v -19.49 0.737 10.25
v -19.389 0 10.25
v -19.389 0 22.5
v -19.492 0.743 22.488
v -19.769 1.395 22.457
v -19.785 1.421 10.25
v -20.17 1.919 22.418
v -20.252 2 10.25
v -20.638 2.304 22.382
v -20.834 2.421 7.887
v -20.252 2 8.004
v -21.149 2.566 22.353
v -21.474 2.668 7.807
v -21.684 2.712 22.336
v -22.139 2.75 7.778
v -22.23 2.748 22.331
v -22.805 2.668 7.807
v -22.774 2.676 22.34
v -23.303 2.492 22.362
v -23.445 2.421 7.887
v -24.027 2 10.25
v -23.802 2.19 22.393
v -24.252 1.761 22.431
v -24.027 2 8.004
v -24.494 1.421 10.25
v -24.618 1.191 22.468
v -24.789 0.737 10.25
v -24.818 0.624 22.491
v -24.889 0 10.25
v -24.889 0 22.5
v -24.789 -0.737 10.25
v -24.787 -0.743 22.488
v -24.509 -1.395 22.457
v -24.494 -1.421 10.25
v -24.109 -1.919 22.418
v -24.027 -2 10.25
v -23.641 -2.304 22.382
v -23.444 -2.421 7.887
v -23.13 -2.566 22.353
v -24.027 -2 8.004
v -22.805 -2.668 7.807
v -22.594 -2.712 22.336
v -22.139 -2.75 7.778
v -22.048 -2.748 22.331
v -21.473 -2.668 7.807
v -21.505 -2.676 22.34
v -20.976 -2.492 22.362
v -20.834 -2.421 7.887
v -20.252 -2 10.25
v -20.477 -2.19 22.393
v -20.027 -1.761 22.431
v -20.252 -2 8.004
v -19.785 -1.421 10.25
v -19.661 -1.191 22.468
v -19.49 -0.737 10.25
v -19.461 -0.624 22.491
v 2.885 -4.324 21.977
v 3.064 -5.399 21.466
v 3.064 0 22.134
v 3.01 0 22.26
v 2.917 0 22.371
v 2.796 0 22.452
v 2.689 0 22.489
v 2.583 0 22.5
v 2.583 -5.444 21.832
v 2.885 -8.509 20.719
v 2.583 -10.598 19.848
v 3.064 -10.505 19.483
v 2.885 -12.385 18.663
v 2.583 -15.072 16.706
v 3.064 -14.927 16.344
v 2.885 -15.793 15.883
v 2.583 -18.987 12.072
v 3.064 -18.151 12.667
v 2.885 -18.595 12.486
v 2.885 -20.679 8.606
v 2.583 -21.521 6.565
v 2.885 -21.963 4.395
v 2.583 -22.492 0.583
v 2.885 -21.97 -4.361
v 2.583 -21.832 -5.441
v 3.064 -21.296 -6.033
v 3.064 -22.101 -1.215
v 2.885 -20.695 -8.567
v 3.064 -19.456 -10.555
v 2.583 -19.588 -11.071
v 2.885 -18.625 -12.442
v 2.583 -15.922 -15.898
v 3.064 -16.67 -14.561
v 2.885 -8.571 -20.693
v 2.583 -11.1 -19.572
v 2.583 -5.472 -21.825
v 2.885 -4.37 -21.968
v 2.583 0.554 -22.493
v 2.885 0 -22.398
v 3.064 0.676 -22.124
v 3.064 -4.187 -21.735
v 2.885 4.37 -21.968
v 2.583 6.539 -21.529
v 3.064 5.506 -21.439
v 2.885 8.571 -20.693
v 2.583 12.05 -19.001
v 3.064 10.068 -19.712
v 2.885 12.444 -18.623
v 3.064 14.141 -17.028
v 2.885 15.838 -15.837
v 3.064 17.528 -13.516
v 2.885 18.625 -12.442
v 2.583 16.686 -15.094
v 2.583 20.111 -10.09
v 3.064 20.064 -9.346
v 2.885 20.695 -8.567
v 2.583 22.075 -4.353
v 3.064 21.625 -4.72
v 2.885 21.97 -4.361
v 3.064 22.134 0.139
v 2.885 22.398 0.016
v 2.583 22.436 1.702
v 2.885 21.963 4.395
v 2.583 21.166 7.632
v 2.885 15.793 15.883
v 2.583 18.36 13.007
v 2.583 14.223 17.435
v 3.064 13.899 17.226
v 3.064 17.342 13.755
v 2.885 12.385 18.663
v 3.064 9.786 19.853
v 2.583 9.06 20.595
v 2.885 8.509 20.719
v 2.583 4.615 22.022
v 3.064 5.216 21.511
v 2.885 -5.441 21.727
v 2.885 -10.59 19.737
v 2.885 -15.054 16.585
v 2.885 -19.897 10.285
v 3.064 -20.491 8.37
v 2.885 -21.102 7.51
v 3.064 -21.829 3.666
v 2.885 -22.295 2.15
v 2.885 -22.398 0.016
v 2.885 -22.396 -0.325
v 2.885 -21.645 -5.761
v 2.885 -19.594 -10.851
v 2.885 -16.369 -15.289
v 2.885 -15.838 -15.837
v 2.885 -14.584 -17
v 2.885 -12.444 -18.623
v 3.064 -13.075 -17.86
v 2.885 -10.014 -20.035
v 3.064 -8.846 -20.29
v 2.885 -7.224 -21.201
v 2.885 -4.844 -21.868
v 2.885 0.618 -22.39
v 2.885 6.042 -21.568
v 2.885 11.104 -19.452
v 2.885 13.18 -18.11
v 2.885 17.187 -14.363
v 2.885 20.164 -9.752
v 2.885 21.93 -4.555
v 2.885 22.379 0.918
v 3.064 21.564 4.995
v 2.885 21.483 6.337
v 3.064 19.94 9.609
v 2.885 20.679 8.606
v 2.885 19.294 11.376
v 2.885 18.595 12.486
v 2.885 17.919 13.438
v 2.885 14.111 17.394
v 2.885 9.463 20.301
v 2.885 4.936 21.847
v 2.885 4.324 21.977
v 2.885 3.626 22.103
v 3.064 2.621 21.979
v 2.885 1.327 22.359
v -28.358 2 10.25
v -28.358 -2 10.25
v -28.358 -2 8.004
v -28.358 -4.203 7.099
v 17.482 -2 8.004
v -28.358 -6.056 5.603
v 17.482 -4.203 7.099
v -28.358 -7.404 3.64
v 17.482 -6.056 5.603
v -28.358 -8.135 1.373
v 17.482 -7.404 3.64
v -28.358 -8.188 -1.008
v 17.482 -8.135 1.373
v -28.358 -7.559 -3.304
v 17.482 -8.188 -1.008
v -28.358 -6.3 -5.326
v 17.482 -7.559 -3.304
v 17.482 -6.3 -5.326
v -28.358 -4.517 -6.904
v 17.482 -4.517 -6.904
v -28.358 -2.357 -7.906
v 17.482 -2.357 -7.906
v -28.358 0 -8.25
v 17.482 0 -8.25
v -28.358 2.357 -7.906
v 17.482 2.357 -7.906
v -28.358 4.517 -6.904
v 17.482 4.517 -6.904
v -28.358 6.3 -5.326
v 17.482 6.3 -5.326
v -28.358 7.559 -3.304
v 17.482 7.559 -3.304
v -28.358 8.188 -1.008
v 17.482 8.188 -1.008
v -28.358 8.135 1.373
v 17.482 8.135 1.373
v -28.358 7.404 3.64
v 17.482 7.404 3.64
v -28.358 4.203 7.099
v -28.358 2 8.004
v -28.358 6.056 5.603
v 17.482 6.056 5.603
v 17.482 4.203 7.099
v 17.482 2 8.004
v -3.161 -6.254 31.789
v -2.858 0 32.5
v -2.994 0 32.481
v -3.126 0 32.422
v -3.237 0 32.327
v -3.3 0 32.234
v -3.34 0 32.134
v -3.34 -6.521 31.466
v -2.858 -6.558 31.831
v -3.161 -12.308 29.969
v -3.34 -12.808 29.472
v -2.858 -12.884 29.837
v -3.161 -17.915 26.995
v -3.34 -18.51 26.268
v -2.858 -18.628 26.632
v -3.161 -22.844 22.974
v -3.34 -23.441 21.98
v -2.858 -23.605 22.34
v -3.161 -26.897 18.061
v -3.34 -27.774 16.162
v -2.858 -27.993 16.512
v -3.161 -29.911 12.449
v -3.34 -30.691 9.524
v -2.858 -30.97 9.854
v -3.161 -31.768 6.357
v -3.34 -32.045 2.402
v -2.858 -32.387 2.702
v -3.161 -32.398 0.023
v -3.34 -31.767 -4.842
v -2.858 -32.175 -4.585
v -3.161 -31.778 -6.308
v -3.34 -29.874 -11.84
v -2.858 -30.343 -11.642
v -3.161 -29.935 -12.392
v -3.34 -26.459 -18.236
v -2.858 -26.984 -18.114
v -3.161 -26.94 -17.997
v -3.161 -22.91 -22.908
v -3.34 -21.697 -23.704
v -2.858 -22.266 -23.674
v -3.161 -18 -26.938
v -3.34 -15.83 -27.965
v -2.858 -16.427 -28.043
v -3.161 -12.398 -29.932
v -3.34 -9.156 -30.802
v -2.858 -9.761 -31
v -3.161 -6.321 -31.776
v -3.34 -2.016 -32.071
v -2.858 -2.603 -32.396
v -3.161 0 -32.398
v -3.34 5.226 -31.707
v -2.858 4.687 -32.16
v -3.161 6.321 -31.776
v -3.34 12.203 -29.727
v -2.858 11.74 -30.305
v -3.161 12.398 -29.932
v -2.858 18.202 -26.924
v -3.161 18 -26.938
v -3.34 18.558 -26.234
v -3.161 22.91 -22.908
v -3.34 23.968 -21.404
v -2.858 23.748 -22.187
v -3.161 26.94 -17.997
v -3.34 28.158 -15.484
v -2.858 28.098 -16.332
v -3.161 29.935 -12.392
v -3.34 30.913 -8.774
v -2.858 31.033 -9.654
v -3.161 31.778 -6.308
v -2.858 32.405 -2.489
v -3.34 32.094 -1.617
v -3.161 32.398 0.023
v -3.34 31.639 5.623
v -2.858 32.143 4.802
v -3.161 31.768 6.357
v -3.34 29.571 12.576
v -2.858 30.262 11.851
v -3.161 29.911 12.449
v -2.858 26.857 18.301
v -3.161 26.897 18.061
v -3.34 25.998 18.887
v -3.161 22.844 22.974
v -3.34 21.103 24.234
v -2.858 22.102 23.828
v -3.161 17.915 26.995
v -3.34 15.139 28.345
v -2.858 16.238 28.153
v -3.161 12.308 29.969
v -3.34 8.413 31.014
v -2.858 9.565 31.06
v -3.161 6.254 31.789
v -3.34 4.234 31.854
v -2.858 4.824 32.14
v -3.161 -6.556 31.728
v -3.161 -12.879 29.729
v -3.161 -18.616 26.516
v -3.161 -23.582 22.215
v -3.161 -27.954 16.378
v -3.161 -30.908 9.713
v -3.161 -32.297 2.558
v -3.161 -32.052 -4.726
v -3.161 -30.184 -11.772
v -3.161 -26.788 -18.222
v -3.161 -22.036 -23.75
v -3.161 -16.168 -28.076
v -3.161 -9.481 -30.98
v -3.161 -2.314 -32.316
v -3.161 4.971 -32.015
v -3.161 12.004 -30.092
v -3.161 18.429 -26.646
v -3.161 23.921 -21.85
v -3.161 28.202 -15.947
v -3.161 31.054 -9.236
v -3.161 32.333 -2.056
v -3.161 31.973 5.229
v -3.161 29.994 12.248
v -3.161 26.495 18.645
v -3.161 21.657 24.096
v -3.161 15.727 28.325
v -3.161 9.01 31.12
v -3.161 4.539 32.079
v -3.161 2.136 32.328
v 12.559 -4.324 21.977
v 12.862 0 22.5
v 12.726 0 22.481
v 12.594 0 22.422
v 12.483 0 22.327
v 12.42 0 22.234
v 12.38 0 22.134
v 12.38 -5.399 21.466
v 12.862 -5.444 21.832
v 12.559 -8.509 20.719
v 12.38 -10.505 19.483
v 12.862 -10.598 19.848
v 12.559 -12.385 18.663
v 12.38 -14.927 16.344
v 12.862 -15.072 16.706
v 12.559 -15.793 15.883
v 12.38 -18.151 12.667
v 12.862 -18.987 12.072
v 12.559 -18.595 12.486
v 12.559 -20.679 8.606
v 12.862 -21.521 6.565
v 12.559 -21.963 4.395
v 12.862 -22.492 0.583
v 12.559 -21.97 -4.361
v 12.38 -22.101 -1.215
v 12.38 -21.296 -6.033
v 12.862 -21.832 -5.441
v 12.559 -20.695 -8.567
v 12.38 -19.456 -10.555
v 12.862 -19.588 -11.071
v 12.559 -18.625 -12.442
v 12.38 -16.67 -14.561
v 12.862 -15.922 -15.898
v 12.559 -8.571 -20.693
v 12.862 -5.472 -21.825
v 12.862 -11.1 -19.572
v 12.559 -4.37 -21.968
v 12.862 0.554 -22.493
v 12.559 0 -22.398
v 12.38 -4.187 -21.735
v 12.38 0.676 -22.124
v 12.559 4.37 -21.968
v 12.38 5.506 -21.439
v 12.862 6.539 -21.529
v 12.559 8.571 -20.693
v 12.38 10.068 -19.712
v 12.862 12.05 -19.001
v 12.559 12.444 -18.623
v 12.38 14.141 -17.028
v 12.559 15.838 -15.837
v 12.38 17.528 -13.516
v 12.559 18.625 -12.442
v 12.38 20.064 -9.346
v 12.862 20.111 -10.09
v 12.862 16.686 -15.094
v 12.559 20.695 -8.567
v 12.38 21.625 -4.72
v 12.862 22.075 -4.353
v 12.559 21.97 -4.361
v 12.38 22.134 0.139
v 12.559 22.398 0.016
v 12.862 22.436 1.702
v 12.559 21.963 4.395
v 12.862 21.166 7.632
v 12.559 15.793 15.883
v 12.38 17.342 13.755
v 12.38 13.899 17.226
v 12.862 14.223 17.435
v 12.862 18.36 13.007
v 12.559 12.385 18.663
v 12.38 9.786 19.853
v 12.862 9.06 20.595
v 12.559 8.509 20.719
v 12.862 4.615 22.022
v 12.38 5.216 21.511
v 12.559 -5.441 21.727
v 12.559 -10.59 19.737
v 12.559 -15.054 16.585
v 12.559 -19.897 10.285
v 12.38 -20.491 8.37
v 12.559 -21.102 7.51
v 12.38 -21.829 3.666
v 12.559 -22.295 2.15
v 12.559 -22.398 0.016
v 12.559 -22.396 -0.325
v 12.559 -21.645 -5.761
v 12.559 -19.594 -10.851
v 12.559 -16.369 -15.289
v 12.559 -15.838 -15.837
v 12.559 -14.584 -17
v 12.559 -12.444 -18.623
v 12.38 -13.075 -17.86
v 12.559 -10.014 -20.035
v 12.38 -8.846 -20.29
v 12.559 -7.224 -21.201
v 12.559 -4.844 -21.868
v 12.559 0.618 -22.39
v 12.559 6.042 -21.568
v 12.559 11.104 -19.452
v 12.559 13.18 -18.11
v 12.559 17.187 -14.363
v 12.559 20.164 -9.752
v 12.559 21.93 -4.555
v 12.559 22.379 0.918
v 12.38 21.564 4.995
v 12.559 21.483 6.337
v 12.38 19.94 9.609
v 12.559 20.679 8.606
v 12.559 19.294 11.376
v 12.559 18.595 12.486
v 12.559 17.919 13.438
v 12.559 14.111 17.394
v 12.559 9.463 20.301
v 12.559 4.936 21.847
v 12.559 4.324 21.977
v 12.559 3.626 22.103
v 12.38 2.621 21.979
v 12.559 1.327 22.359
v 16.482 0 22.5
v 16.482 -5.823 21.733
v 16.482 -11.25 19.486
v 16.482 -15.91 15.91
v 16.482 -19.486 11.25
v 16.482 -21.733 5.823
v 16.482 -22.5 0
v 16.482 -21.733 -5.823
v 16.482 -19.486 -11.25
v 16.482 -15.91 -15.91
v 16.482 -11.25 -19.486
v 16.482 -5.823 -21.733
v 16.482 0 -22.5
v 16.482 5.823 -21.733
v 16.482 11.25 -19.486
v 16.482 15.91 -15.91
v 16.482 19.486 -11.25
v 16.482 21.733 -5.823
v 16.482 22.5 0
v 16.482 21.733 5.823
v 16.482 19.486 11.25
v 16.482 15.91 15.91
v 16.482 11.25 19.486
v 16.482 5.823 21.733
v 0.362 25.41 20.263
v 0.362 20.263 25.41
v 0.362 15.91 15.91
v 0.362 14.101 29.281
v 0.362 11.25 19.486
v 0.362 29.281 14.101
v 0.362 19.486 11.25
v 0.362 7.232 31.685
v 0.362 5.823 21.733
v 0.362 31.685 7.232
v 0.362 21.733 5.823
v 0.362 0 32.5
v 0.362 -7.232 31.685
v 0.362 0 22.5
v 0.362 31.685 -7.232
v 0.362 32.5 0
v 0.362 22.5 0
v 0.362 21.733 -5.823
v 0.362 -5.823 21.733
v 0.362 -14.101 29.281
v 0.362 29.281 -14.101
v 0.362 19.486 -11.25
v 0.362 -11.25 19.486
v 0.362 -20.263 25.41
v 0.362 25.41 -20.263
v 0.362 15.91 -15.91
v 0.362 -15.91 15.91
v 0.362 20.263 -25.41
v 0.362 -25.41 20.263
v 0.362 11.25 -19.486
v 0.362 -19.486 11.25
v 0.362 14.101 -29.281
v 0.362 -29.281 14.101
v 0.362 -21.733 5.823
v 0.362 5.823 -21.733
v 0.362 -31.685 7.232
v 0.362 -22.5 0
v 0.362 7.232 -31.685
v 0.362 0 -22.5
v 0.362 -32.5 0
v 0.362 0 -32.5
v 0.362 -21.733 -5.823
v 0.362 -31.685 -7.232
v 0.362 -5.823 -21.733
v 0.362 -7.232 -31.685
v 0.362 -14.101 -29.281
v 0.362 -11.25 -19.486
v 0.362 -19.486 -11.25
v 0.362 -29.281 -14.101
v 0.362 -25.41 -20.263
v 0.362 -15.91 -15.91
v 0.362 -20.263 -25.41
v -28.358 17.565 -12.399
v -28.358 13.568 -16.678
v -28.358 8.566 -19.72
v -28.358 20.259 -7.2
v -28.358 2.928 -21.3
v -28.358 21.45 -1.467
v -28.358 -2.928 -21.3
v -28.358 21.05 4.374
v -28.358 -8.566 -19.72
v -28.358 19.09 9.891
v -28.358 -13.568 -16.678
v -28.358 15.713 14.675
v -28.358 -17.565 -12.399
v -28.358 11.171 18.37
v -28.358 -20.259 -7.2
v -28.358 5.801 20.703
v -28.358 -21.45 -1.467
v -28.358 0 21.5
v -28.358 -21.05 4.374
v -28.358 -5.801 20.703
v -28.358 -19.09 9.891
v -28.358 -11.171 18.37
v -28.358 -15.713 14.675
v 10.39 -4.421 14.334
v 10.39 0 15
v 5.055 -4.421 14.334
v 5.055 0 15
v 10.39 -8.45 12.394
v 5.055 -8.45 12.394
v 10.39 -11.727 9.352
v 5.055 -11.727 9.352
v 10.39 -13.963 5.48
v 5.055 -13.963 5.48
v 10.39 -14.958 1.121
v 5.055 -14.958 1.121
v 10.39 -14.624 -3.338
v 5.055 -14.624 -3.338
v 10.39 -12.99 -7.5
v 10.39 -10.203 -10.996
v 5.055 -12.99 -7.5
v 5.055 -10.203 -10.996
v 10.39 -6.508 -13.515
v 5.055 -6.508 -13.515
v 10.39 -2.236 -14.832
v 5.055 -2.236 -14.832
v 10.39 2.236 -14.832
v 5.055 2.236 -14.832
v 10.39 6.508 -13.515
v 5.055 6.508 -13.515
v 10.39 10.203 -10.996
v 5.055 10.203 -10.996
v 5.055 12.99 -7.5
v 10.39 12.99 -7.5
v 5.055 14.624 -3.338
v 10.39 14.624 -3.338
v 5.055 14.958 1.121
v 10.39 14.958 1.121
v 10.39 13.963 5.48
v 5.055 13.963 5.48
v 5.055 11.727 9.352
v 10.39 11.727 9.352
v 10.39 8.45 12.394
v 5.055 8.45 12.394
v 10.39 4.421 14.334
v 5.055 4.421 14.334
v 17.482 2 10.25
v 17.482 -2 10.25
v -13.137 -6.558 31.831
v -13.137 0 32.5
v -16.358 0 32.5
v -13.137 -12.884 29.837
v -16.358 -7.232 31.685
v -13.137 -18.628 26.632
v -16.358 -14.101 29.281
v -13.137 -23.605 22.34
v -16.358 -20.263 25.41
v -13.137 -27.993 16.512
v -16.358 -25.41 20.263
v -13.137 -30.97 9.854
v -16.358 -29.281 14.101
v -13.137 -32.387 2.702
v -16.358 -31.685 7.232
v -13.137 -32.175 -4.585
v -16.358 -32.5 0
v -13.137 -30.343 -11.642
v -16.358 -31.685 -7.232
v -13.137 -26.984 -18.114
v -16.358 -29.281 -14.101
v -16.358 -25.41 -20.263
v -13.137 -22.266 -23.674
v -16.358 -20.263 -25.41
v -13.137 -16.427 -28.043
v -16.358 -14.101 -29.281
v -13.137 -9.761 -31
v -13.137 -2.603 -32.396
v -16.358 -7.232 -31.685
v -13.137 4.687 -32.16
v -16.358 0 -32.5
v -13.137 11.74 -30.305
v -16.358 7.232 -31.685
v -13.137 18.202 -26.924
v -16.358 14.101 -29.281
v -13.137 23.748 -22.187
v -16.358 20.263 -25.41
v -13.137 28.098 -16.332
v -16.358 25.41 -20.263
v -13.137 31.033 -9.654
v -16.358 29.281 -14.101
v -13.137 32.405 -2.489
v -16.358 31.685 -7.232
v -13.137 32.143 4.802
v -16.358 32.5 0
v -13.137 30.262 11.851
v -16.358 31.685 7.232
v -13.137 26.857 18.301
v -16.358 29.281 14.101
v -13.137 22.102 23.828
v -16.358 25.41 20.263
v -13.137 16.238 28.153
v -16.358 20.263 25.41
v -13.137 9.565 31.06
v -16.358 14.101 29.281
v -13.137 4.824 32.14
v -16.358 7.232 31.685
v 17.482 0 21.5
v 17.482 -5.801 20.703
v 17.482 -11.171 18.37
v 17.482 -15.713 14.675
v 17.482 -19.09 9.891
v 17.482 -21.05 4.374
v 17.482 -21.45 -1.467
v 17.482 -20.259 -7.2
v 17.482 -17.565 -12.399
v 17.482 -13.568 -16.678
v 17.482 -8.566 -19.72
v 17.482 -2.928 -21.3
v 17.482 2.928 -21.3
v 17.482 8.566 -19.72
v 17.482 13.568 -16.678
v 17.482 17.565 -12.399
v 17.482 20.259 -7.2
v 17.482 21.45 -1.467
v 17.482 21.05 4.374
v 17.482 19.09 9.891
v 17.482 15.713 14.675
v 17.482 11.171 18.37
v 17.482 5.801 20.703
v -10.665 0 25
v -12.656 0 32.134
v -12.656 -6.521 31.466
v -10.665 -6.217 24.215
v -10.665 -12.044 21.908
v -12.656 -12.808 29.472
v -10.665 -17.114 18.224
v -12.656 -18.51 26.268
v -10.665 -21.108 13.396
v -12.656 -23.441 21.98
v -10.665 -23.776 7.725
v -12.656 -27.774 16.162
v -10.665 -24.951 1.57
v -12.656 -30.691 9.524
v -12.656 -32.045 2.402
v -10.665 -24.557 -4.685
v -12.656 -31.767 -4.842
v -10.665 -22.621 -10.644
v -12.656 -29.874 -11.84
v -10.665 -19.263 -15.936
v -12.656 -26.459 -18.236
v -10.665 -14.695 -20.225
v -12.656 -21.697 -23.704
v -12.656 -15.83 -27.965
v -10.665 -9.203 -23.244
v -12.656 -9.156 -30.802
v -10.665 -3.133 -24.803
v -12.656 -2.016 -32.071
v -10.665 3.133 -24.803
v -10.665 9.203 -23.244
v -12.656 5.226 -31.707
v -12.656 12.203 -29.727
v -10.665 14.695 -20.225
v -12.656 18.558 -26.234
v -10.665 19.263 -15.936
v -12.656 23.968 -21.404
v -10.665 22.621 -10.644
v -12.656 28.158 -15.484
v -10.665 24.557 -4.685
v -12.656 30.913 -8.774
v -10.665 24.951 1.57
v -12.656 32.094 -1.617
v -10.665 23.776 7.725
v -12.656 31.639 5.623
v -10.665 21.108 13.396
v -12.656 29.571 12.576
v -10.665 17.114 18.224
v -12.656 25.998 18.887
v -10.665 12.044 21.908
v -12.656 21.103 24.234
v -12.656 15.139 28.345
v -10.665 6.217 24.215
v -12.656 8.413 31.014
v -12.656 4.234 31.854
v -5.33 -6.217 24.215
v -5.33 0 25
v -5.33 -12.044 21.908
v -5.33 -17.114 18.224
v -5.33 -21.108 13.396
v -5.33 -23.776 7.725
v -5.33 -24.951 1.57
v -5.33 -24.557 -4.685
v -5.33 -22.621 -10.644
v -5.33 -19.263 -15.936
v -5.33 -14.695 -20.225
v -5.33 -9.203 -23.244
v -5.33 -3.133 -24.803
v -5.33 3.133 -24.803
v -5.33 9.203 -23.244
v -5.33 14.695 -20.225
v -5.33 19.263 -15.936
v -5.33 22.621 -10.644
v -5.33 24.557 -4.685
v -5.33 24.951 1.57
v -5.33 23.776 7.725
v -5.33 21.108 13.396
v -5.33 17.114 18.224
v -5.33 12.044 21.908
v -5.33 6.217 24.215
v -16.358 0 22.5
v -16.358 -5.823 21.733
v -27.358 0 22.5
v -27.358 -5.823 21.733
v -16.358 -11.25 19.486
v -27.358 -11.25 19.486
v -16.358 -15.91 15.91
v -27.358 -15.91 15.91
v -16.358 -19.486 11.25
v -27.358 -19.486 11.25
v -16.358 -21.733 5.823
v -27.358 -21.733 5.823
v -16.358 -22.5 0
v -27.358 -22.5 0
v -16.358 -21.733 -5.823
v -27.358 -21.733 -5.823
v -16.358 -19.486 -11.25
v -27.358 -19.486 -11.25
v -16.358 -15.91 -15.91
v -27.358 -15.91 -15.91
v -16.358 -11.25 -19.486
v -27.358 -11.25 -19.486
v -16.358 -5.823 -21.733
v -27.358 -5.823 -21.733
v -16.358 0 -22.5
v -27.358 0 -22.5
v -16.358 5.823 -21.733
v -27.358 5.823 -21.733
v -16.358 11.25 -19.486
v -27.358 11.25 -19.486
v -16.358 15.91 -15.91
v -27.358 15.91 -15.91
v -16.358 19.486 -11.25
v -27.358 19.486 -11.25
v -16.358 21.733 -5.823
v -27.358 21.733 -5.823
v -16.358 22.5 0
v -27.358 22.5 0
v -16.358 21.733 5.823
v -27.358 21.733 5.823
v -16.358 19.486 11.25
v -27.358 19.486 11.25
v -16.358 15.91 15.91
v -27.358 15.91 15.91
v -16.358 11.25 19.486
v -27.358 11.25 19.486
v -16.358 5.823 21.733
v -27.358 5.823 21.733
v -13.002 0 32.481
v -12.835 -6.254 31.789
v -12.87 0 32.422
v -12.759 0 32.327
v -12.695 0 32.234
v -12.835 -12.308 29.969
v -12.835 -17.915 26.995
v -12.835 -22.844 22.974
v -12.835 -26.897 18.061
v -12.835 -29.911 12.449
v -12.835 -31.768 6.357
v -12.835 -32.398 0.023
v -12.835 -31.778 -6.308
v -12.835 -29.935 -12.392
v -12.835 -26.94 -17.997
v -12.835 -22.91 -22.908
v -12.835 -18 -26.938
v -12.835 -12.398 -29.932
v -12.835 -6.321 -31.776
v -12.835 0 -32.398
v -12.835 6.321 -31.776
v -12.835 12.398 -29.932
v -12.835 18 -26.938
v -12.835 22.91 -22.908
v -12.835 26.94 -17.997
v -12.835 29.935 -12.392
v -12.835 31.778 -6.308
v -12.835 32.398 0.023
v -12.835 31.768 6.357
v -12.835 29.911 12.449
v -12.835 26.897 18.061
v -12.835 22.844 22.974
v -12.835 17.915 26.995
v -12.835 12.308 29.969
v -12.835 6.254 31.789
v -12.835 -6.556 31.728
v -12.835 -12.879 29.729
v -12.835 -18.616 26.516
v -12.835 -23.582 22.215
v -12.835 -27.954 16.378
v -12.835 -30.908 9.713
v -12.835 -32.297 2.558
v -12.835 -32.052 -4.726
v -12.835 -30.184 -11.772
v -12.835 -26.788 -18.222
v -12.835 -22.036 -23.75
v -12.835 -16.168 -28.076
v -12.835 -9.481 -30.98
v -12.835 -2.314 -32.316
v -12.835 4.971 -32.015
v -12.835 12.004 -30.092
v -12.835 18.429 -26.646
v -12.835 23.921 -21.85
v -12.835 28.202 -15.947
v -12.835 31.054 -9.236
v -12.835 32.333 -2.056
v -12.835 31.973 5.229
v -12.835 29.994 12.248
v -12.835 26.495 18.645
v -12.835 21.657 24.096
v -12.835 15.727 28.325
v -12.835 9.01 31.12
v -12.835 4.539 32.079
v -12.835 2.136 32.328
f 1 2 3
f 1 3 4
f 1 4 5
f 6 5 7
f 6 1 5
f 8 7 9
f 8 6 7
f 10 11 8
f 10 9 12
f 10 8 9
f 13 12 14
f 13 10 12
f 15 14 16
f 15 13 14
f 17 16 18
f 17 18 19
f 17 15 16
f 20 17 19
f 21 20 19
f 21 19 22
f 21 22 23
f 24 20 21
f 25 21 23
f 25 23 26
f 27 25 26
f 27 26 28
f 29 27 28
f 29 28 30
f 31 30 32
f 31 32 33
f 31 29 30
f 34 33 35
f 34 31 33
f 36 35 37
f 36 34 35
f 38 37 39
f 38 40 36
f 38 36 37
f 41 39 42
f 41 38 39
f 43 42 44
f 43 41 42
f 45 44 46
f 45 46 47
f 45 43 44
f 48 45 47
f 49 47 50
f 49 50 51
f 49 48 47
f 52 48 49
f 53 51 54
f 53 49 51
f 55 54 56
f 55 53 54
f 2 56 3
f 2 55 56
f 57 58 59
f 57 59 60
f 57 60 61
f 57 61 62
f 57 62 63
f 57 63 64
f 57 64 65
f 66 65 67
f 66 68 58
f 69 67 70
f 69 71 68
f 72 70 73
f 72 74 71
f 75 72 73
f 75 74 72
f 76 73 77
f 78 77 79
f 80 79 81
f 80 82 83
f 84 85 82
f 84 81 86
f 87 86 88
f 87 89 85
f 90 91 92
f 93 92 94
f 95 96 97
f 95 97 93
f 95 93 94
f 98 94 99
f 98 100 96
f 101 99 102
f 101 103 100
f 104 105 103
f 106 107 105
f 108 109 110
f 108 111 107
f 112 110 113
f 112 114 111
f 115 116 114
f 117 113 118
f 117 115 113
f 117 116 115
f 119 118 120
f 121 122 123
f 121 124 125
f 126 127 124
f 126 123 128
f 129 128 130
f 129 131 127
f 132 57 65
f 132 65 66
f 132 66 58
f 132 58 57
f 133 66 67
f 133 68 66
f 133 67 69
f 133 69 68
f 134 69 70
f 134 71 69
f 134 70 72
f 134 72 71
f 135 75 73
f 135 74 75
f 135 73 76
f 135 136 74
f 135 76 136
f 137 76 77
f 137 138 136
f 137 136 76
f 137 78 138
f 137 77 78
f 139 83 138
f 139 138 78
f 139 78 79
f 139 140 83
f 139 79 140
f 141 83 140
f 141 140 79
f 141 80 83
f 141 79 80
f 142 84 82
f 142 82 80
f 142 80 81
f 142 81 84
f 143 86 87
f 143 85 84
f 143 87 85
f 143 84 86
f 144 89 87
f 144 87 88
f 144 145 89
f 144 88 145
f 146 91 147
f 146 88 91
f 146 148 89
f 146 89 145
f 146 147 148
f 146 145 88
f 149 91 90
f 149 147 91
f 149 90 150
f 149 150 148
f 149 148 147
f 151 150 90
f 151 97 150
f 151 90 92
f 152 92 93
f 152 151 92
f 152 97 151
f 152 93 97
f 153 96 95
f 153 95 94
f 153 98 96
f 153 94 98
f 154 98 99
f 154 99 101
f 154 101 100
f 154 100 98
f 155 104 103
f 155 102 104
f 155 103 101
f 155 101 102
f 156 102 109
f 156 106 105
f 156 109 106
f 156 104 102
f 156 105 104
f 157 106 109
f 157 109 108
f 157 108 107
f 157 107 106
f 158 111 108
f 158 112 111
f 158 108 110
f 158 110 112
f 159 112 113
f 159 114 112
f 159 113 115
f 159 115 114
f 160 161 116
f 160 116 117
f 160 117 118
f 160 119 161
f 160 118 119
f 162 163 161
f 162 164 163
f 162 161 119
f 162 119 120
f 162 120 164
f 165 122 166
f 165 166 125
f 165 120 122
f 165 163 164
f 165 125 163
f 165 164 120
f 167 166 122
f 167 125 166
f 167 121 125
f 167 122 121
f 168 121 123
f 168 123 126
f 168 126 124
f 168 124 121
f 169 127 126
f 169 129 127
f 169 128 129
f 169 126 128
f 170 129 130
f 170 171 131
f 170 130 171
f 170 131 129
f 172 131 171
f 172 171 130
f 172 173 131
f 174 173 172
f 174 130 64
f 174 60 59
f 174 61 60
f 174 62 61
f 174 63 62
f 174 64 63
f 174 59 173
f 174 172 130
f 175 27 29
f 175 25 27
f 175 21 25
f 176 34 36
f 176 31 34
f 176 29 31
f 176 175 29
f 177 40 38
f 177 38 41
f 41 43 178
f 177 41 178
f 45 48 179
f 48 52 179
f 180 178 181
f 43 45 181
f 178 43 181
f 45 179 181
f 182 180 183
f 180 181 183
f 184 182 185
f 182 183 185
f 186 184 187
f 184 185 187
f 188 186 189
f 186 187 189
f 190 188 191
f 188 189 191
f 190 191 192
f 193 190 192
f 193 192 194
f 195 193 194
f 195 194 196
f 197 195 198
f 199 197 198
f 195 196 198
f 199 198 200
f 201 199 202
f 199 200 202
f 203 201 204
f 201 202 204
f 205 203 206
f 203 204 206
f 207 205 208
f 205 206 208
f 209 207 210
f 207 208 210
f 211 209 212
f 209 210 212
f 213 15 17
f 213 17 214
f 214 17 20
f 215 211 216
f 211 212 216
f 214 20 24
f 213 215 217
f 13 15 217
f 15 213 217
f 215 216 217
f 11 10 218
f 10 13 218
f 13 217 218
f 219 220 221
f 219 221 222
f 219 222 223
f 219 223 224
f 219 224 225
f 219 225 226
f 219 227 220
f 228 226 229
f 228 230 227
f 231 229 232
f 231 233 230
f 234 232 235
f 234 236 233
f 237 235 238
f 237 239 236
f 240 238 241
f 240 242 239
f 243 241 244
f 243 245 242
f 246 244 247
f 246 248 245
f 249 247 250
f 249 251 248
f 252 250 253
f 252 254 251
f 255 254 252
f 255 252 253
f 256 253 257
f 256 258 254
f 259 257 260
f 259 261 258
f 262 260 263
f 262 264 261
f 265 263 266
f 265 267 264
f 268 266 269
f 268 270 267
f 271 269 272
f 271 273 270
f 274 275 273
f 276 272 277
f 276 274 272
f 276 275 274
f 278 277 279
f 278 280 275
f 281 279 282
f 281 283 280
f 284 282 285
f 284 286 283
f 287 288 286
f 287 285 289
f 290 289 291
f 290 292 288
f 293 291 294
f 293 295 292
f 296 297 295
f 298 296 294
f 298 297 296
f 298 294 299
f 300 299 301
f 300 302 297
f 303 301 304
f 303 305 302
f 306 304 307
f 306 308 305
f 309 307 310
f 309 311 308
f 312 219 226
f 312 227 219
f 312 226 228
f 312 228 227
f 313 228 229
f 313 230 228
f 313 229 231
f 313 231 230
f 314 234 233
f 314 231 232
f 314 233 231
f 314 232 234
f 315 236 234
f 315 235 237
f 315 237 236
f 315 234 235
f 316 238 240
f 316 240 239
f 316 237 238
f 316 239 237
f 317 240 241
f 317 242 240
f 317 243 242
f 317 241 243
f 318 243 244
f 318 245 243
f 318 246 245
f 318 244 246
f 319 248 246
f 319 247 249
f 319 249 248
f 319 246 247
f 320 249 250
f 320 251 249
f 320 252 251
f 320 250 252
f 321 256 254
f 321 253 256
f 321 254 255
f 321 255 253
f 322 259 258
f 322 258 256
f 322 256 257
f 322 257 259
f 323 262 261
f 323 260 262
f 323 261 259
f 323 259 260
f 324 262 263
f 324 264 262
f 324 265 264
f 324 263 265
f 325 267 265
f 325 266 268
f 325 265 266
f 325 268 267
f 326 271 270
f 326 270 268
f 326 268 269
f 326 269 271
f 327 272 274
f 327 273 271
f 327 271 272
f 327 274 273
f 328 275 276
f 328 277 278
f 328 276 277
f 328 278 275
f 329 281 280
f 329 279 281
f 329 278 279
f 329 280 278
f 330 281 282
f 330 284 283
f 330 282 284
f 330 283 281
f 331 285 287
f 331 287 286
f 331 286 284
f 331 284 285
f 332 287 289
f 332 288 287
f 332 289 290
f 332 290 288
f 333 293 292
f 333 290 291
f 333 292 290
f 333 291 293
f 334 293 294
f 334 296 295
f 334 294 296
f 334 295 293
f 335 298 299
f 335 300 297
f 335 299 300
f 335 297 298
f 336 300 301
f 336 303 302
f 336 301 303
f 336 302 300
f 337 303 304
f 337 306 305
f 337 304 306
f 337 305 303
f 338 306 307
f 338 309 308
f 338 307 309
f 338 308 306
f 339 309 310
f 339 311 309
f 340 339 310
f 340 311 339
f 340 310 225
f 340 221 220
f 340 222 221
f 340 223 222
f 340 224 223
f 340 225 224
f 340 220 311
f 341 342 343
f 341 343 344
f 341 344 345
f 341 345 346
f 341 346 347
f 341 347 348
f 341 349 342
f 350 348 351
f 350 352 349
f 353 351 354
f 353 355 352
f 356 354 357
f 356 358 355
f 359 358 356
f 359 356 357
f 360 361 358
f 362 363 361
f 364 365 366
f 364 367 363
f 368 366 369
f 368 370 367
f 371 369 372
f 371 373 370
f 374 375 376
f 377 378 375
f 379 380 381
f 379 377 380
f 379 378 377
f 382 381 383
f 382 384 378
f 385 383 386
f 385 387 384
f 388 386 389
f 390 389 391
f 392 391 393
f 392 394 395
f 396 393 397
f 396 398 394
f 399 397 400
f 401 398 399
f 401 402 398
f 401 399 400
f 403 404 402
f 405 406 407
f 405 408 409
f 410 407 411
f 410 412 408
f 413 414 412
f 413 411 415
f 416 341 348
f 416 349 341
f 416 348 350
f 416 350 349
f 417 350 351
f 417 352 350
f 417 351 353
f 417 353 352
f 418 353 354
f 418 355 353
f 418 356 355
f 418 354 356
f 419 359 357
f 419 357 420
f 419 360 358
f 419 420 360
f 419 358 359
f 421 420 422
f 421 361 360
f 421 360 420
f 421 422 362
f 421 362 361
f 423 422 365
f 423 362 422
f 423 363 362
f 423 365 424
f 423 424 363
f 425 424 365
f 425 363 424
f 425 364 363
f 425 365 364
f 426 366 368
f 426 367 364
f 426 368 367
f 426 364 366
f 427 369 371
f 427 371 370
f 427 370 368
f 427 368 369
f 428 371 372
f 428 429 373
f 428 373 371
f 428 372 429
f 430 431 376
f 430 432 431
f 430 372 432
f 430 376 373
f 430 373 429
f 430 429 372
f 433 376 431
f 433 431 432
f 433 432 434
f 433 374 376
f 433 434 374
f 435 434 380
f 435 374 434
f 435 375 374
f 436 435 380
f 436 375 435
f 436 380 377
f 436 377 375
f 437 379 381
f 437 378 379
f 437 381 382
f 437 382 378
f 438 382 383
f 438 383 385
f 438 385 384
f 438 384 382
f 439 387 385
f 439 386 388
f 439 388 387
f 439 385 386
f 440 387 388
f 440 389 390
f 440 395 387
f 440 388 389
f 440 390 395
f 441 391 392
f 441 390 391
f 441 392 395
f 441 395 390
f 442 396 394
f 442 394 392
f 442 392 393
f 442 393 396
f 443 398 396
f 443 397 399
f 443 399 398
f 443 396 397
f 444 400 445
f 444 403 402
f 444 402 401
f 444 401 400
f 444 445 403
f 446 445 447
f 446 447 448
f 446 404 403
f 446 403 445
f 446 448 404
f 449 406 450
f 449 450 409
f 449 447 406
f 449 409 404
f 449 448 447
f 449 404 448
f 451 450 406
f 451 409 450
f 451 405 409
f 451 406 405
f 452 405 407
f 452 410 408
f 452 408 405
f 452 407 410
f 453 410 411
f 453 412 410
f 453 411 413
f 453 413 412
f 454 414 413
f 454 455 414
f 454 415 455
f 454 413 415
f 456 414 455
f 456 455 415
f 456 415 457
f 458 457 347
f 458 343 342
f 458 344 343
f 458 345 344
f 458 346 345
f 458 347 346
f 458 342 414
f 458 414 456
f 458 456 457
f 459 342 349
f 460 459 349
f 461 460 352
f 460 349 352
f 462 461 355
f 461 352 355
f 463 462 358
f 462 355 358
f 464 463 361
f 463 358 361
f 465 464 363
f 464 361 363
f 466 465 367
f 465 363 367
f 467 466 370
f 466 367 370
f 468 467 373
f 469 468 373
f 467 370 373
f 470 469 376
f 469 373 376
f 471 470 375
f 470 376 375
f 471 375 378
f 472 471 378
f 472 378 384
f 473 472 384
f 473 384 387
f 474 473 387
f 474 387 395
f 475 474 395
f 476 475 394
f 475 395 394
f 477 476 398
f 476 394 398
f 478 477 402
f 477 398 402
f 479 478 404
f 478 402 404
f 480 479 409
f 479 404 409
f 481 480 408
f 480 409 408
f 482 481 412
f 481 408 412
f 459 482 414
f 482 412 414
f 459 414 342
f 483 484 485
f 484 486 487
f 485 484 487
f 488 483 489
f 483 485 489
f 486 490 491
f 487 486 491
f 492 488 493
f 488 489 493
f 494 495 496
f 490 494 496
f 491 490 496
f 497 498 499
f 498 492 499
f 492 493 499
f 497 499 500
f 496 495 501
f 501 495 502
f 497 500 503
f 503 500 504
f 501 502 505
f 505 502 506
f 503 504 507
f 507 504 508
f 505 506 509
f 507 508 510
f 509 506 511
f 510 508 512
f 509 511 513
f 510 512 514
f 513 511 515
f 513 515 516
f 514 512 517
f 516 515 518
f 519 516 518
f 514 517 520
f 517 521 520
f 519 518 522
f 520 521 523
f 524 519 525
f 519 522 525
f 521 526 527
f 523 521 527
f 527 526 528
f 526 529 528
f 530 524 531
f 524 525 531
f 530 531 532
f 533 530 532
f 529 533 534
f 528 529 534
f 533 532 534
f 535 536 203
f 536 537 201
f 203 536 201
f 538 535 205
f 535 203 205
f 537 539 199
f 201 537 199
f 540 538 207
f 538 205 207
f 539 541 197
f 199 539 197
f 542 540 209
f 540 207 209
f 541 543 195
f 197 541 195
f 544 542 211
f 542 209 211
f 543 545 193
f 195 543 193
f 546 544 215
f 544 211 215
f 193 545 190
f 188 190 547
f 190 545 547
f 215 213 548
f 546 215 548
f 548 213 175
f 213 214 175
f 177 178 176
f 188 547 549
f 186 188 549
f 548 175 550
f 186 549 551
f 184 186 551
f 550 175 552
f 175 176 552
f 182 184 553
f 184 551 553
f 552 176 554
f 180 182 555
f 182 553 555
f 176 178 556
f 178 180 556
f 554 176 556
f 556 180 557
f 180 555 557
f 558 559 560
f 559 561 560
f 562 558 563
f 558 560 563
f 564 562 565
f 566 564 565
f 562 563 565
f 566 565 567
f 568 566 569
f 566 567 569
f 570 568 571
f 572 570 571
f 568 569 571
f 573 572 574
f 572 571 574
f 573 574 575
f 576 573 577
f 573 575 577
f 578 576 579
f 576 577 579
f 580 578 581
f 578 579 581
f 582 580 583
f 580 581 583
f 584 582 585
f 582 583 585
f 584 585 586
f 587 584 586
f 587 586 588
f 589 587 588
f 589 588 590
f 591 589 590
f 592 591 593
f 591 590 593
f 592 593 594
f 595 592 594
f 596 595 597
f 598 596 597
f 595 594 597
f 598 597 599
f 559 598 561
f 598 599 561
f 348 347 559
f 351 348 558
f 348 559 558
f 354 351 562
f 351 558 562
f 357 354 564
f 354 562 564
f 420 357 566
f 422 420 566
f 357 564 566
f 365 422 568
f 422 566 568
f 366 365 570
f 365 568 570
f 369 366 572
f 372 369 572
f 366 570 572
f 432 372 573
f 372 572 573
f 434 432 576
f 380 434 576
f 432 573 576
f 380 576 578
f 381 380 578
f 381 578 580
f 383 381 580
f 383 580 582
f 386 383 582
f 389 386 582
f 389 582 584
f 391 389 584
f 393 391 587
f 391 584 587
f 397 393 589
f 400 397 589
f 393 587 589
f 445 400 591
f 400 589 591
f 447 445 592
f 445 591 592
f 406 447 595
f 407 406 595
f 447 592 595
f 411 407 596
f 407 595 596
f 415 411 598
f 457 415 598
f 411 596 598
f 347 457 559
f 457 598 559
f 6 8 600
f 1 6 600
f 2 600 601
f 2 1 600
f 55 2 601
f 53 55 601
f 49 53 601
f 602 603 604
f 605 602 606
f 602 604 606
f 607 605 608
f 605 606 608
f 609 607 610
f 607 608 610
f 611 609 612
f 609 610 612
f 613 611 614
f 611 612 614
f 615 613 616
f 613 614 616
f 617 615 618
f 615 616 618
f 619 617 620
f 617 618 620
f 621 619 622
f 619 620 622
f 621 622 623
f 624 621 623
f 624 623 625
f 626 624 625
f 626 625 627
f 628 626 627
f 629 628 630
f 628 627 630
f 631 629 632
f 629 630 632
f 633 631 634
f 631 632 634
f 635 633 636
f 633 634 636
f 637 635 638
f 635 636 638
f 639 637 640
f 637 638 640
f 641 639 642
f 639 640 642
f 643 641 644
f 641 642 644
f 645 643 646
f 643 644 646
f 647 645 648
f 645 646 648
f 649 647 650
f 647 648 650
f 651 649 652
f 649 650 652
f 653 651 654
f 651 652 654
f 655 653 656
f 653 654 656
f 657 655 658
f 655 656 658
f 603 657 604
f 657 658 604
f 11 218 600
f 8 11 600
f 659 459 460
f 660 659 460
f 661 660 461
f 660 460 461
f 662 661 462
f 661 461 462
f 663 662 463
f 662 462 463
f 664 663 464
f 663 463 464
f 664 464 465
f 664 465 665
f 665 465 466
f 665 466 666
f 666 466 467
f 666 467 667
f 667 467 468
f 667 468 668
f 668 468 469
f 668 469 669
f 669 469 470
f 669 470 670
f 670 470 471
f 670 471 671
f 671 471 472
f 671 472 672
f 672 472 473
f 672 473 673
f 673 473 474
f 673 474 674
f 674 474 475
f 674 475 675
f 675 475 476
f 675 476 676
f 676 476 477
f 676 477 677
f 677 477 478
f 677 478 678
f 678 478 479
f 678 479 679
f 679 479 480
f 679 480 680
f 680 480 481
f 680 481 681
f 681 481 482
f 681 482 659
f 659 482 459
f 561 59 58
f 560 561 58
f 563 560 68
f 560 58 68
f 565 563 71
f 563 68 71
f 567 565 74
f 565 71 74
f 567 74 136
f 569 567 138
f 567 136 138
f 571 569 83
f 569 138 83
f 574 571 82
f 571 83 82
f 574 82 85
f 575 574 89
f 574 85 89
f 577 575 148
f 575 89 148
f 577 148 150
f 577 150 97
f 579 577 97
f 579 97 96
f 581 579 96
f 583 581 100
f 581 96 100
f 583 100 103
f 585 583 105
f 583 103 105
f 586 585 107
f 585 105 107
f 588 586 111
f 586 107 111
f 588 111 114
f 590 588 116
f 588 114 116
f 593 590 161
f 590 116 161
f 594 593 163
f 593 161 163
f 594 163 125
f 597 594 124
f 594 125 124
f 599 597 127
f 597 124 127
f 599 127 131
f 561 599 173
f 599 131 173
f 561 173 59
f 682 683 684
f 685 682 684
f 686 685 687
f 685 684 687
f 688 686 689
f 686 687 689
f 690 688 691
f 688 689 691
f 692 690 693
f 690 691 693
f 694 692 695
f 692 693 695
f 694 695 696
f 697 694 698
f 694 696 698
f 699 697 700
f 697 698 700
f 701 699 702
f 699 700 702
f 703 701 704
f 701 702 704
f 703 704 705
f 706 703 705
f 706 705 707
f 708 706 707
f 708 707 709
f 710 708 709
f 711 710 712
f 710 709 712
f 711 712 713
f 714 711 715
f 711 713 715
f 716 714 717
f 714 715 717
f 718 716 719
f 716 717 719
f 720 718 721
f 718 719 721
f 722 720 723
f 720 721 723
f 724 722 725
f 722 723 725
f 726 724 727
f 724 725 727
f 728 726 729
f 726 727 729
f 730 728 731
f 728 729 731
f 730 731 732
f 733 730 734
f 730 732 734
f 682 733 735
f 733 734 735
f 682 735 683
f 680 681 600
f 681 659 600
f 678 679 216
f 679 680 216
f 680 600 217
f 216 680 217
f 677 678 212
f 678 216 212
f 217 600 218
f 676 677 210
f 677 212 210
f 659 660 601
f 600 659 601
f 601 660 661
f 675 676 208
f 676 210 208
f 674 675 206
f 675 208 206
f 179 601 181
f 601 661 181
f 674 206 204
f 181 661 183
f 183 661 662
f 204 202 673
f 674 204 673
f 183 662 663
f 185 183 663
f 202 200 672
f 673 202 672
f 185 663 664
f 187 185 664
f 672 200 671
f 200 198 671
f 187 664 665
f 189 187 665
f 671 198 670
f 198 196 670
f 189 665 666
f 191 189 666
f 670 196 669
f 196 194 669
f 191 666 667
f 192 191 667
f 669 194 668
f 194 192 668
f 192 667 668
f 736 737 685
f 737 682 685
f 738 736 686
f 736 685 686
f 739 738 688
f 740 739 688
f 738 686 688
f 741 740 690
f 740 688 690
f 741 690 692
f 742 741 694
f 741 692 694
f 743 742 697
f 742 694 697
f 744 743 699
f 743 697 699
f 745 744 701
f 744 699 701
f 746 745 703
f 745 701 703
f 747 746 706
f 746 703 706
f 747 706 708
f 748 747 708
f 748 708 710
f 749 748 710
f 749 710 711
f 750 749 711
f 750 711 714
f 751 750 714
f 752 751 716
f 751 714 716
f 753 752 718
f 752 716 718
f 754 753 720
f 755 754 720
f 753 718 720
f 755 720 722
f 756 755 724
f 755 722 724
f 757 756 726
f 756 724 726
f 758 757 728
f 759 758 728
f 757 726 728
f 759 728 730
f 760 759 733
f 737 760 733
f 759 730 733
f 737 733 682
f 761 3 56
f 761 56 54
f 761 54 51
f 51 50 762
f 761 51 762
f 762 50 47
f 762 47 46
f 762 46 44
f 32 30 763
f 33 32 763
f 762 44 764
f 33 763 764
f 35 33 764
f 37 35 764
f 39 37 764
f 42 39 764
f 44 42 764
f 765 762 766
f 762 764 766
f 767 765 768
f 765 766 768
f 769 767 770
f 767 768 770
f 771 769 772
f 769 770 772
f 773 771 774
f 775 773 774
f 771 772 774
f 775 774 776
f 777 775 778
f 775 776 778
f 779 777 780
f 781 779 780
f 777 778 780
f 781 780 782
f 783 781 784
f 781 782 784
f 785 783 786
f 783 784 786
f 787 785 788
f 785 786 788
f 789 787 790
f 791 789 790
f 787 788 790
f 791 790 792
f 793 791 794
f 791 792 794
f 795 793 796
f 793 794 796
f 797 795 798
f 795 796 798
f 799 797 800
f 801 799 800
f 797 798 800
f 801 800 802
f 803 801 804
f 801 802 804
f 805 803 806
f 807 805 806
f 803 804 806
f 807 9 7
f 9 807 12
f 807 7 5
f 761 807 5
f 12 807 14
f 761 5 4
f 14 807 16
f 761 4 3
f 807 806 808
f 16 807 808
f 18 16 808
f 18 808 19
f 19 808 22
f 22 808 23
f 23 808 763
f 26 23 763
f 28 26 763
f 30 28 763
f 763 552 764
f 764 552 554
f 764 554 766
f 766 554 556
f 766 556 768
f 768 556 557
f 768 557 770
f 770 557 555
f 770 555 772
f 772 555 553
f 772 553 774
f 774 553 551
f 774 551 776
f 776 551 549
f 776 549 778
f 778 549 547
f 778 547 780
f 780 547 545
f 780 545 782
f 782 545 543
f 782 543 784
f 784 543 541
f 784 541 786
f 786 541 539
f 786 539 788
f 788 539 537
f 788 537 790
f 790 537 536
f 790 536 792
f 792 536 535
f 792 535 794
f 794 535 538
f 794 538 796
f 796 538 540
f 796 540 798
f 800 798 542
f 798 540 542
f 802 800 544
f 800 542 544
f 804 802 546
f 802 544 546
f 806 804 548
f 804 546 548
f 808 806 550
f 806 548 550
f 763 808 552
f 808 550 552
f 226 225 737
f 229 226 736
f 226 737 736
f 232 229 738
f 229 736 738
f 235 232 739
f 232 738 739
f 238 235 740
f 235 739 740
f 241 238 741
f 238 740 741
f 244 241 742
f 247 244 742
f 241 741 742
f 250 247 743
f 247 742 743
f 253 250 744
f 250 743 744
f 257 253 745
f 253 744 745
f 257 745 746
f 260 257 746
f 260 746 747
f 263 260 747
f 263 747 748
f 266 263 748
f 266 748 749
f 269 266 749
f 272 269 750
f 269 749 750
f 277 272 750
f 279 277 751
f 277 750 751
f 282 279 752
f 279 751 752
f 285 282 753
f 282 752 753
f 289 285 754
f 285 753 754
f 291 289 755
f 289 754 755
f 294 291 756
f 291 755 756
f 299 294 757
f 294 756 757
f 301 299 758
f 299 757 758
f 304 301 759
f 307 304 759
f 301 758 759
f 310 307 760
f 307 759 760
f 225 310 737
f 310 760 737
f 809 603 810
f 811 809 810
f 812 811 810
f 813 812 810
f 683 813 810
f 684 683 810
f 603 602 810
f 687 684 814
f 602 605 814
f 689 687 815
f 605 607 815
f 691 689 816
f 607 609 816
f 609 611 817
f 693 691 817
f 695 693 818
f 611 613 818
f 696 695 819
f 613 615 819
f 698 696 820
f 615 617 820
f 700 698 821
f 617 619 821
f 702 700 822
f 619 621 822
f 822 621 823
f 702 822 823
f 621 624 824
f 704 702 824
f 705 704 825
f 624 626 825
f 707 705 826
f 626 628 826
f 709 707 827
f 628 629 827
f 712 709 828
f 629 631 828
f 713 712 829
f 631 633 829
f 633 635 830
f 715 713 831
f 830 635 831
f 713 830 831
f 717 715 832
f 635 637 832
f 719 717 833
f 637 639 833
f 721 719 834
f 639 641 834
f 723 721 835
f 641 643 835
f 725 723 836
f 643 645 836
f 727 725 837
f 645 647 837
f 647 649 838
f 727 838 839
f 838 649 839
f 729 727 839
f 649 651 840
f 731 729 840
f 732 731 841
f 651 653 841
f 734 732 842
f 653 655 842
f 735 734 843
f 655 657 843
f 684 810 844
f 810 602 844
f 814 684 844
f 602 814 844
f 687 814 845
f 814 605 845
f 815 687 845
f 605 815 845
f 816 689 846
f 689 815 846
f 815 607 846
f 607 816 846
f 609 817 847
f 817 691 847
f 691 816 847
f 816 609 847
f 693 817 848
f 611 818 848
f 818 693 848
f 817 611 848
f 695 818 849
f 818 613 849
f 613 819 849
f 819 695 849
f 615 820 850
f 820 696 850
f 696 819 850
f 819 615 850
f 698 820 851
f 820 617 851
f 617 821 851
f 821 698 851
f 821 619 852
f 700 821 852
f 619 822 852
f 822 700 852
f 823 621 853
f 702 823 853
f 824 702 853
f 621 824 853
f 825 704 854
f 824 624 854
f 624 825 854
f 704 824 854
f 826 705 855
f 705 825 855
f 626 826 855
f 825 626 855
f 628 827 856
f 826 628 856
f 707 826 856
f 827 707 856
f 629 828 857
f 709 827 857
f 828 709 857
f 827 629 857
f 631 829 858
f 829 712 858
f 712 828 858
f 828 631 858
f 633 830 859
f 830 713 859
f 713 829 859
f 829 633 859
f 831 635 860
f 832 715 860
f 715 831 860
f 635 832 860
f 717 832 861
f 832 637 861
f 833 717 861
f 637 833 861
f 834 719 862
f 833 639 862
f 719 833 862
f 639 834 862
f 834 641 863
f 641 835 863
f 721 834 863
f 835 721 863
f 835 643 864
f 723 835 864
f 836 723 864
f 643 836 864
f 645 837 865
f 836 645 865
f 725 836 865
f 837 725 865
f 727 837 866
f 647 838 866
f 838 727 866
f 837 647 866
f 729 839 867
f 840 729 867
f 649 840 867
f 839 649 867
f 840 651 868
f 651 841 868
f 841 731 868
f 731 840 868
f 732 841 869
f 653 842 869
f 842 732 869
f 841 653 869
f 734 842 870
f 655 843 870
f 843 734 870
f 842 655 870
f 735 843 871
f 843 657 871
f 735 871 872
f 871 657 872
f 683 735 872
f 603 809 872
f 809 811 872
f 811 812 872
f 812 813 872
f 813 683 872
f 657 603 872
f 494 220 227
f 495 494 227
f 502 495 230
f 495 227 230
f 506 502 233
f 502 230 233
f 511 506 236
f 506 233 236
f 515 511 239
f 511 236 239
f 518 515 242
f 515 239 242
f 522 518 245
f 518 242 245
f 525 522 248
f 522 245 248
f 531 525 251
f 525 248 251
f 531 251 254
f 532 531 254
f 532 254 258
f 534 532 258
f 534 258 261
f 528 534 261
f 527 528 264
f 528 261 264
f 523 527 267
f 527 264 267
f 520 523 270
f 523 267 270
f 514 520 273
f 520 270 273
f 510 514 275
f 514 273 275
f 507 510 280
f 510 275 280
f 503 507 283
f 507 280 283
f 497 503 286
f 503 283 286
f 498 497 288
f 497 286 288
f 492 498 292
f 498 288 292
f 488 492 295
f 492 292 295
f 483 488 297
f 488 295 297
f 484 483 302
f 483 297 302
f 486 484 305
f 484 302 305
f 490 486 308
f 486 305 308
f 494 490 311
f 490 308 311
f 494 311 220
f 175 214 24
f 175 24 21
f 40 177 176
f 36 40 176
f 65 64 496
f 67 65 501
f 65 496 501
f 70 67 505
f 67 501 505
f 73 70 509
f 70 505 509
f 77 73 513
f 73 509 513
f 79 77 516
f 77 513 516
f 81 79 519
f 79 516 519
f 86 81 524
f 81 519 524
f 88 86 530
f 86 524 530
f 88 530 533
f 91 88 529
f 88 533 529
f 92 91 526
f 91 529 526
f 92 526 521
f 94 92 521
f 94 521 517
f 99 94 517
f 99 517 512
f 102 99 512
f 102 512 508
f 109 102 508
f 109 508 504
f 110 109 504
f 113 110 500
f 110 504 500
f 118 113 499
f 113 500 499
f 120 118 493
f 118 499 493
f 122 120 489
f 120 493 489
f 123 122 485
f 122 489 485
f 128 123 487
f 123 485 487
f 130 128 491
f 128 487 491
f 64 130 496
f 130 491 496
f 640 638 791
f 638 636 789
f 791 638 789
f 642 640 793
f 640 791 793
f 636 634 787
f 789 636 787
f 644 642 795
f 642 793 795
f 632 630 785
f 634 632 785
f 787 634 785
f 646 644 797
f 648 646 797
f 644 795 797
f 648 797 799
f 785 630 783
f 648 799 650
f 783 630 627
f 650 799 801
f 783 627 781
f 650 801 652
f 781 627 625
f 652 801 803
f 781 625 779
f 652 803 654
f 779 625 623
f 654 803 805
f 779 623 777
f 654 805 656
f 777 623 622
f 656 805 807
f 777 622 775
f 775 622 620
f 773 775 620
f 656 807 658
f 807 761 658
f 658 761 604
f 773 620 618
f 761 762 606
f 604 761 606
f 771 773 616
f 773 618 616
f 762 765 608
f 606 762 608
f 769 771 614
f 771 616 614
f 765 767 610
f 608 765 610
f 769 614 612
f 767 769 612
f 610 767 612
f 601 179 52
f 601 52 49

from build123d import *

# Parameters (mm, degrees)
F2_SIZE  = 1
F3_R     = 0.5
F4_W     = 4
F4_H     = 4
F5_DEPTH = 45.841
F6_R     = 2.75
F7_DEPTH = 25


with BuildPart() as f1:
    # F0 (on Front) → F1 (revolve)
    with BuildSketch(Plane.XZ):
        Polygon((-28.357783, 8.25), (-16.357783, 8.25), (0.362217, 8.25), (17.482217, 8.25), (17.482217, 22.5), (12.482217, 22.5), (10.389732, 15), (5.054703, 15), (2.962217, 22.5), (0.362217, 22.5), (0.362217, 32.5), (-3.237783, 32.5), (-5.330268, 25), (-10.665297, 25), (-12.757783, 32.5), (-16.357783, 32.5), (-16.357783, 22.5), (-28.357783, 22.5), align=None)
    revolve(axis=Axis((9.010959, 0, 0), (1, 0, 0)))

    # F2
    f2_edges = [f1.edges().sort_by_distance(p)[0] for p in [
        (-28.357783, 0, -22.5),
        (17.482217, 0, -22.5),
    ]]
    chamfer(f2_edges, length=F2_SIZE)

    # F3
    f3_edges = [f1.edges().sort_by_distance(p)[0] for p in [
        (-12.757783, 0, -32.5),
        (-3.237783, 0, -32.5),
        (2.962217, 0, -22.5),
        (12.482217, 0, -22.5),
    ]]
    fillet(f3_edges, radius=F3_R)

    # F4 (on face) → F5 (cut, through all)
    with BuildSketch(Plane(origin=(-28.357783, 0, 0), x_dir=(0, -1, 0), z_dir=(-1, 0, 0))):
        with Locations((0, 8.25)):
            Rectangle(F4_W, F4_H)
    extrude(amount=-F5_DEPTH, mode=Mode.SUBTRACT)

    # F6 (on Top) → F7 (cut)
    with BuildSketch(Plane.XY):
        with Locations((-22.139326, 0)):
            Circle(F6_R)
    extrude(amount=F7_DEPTH, mode=Mode.SUBTRACT)


solid = f1.part
